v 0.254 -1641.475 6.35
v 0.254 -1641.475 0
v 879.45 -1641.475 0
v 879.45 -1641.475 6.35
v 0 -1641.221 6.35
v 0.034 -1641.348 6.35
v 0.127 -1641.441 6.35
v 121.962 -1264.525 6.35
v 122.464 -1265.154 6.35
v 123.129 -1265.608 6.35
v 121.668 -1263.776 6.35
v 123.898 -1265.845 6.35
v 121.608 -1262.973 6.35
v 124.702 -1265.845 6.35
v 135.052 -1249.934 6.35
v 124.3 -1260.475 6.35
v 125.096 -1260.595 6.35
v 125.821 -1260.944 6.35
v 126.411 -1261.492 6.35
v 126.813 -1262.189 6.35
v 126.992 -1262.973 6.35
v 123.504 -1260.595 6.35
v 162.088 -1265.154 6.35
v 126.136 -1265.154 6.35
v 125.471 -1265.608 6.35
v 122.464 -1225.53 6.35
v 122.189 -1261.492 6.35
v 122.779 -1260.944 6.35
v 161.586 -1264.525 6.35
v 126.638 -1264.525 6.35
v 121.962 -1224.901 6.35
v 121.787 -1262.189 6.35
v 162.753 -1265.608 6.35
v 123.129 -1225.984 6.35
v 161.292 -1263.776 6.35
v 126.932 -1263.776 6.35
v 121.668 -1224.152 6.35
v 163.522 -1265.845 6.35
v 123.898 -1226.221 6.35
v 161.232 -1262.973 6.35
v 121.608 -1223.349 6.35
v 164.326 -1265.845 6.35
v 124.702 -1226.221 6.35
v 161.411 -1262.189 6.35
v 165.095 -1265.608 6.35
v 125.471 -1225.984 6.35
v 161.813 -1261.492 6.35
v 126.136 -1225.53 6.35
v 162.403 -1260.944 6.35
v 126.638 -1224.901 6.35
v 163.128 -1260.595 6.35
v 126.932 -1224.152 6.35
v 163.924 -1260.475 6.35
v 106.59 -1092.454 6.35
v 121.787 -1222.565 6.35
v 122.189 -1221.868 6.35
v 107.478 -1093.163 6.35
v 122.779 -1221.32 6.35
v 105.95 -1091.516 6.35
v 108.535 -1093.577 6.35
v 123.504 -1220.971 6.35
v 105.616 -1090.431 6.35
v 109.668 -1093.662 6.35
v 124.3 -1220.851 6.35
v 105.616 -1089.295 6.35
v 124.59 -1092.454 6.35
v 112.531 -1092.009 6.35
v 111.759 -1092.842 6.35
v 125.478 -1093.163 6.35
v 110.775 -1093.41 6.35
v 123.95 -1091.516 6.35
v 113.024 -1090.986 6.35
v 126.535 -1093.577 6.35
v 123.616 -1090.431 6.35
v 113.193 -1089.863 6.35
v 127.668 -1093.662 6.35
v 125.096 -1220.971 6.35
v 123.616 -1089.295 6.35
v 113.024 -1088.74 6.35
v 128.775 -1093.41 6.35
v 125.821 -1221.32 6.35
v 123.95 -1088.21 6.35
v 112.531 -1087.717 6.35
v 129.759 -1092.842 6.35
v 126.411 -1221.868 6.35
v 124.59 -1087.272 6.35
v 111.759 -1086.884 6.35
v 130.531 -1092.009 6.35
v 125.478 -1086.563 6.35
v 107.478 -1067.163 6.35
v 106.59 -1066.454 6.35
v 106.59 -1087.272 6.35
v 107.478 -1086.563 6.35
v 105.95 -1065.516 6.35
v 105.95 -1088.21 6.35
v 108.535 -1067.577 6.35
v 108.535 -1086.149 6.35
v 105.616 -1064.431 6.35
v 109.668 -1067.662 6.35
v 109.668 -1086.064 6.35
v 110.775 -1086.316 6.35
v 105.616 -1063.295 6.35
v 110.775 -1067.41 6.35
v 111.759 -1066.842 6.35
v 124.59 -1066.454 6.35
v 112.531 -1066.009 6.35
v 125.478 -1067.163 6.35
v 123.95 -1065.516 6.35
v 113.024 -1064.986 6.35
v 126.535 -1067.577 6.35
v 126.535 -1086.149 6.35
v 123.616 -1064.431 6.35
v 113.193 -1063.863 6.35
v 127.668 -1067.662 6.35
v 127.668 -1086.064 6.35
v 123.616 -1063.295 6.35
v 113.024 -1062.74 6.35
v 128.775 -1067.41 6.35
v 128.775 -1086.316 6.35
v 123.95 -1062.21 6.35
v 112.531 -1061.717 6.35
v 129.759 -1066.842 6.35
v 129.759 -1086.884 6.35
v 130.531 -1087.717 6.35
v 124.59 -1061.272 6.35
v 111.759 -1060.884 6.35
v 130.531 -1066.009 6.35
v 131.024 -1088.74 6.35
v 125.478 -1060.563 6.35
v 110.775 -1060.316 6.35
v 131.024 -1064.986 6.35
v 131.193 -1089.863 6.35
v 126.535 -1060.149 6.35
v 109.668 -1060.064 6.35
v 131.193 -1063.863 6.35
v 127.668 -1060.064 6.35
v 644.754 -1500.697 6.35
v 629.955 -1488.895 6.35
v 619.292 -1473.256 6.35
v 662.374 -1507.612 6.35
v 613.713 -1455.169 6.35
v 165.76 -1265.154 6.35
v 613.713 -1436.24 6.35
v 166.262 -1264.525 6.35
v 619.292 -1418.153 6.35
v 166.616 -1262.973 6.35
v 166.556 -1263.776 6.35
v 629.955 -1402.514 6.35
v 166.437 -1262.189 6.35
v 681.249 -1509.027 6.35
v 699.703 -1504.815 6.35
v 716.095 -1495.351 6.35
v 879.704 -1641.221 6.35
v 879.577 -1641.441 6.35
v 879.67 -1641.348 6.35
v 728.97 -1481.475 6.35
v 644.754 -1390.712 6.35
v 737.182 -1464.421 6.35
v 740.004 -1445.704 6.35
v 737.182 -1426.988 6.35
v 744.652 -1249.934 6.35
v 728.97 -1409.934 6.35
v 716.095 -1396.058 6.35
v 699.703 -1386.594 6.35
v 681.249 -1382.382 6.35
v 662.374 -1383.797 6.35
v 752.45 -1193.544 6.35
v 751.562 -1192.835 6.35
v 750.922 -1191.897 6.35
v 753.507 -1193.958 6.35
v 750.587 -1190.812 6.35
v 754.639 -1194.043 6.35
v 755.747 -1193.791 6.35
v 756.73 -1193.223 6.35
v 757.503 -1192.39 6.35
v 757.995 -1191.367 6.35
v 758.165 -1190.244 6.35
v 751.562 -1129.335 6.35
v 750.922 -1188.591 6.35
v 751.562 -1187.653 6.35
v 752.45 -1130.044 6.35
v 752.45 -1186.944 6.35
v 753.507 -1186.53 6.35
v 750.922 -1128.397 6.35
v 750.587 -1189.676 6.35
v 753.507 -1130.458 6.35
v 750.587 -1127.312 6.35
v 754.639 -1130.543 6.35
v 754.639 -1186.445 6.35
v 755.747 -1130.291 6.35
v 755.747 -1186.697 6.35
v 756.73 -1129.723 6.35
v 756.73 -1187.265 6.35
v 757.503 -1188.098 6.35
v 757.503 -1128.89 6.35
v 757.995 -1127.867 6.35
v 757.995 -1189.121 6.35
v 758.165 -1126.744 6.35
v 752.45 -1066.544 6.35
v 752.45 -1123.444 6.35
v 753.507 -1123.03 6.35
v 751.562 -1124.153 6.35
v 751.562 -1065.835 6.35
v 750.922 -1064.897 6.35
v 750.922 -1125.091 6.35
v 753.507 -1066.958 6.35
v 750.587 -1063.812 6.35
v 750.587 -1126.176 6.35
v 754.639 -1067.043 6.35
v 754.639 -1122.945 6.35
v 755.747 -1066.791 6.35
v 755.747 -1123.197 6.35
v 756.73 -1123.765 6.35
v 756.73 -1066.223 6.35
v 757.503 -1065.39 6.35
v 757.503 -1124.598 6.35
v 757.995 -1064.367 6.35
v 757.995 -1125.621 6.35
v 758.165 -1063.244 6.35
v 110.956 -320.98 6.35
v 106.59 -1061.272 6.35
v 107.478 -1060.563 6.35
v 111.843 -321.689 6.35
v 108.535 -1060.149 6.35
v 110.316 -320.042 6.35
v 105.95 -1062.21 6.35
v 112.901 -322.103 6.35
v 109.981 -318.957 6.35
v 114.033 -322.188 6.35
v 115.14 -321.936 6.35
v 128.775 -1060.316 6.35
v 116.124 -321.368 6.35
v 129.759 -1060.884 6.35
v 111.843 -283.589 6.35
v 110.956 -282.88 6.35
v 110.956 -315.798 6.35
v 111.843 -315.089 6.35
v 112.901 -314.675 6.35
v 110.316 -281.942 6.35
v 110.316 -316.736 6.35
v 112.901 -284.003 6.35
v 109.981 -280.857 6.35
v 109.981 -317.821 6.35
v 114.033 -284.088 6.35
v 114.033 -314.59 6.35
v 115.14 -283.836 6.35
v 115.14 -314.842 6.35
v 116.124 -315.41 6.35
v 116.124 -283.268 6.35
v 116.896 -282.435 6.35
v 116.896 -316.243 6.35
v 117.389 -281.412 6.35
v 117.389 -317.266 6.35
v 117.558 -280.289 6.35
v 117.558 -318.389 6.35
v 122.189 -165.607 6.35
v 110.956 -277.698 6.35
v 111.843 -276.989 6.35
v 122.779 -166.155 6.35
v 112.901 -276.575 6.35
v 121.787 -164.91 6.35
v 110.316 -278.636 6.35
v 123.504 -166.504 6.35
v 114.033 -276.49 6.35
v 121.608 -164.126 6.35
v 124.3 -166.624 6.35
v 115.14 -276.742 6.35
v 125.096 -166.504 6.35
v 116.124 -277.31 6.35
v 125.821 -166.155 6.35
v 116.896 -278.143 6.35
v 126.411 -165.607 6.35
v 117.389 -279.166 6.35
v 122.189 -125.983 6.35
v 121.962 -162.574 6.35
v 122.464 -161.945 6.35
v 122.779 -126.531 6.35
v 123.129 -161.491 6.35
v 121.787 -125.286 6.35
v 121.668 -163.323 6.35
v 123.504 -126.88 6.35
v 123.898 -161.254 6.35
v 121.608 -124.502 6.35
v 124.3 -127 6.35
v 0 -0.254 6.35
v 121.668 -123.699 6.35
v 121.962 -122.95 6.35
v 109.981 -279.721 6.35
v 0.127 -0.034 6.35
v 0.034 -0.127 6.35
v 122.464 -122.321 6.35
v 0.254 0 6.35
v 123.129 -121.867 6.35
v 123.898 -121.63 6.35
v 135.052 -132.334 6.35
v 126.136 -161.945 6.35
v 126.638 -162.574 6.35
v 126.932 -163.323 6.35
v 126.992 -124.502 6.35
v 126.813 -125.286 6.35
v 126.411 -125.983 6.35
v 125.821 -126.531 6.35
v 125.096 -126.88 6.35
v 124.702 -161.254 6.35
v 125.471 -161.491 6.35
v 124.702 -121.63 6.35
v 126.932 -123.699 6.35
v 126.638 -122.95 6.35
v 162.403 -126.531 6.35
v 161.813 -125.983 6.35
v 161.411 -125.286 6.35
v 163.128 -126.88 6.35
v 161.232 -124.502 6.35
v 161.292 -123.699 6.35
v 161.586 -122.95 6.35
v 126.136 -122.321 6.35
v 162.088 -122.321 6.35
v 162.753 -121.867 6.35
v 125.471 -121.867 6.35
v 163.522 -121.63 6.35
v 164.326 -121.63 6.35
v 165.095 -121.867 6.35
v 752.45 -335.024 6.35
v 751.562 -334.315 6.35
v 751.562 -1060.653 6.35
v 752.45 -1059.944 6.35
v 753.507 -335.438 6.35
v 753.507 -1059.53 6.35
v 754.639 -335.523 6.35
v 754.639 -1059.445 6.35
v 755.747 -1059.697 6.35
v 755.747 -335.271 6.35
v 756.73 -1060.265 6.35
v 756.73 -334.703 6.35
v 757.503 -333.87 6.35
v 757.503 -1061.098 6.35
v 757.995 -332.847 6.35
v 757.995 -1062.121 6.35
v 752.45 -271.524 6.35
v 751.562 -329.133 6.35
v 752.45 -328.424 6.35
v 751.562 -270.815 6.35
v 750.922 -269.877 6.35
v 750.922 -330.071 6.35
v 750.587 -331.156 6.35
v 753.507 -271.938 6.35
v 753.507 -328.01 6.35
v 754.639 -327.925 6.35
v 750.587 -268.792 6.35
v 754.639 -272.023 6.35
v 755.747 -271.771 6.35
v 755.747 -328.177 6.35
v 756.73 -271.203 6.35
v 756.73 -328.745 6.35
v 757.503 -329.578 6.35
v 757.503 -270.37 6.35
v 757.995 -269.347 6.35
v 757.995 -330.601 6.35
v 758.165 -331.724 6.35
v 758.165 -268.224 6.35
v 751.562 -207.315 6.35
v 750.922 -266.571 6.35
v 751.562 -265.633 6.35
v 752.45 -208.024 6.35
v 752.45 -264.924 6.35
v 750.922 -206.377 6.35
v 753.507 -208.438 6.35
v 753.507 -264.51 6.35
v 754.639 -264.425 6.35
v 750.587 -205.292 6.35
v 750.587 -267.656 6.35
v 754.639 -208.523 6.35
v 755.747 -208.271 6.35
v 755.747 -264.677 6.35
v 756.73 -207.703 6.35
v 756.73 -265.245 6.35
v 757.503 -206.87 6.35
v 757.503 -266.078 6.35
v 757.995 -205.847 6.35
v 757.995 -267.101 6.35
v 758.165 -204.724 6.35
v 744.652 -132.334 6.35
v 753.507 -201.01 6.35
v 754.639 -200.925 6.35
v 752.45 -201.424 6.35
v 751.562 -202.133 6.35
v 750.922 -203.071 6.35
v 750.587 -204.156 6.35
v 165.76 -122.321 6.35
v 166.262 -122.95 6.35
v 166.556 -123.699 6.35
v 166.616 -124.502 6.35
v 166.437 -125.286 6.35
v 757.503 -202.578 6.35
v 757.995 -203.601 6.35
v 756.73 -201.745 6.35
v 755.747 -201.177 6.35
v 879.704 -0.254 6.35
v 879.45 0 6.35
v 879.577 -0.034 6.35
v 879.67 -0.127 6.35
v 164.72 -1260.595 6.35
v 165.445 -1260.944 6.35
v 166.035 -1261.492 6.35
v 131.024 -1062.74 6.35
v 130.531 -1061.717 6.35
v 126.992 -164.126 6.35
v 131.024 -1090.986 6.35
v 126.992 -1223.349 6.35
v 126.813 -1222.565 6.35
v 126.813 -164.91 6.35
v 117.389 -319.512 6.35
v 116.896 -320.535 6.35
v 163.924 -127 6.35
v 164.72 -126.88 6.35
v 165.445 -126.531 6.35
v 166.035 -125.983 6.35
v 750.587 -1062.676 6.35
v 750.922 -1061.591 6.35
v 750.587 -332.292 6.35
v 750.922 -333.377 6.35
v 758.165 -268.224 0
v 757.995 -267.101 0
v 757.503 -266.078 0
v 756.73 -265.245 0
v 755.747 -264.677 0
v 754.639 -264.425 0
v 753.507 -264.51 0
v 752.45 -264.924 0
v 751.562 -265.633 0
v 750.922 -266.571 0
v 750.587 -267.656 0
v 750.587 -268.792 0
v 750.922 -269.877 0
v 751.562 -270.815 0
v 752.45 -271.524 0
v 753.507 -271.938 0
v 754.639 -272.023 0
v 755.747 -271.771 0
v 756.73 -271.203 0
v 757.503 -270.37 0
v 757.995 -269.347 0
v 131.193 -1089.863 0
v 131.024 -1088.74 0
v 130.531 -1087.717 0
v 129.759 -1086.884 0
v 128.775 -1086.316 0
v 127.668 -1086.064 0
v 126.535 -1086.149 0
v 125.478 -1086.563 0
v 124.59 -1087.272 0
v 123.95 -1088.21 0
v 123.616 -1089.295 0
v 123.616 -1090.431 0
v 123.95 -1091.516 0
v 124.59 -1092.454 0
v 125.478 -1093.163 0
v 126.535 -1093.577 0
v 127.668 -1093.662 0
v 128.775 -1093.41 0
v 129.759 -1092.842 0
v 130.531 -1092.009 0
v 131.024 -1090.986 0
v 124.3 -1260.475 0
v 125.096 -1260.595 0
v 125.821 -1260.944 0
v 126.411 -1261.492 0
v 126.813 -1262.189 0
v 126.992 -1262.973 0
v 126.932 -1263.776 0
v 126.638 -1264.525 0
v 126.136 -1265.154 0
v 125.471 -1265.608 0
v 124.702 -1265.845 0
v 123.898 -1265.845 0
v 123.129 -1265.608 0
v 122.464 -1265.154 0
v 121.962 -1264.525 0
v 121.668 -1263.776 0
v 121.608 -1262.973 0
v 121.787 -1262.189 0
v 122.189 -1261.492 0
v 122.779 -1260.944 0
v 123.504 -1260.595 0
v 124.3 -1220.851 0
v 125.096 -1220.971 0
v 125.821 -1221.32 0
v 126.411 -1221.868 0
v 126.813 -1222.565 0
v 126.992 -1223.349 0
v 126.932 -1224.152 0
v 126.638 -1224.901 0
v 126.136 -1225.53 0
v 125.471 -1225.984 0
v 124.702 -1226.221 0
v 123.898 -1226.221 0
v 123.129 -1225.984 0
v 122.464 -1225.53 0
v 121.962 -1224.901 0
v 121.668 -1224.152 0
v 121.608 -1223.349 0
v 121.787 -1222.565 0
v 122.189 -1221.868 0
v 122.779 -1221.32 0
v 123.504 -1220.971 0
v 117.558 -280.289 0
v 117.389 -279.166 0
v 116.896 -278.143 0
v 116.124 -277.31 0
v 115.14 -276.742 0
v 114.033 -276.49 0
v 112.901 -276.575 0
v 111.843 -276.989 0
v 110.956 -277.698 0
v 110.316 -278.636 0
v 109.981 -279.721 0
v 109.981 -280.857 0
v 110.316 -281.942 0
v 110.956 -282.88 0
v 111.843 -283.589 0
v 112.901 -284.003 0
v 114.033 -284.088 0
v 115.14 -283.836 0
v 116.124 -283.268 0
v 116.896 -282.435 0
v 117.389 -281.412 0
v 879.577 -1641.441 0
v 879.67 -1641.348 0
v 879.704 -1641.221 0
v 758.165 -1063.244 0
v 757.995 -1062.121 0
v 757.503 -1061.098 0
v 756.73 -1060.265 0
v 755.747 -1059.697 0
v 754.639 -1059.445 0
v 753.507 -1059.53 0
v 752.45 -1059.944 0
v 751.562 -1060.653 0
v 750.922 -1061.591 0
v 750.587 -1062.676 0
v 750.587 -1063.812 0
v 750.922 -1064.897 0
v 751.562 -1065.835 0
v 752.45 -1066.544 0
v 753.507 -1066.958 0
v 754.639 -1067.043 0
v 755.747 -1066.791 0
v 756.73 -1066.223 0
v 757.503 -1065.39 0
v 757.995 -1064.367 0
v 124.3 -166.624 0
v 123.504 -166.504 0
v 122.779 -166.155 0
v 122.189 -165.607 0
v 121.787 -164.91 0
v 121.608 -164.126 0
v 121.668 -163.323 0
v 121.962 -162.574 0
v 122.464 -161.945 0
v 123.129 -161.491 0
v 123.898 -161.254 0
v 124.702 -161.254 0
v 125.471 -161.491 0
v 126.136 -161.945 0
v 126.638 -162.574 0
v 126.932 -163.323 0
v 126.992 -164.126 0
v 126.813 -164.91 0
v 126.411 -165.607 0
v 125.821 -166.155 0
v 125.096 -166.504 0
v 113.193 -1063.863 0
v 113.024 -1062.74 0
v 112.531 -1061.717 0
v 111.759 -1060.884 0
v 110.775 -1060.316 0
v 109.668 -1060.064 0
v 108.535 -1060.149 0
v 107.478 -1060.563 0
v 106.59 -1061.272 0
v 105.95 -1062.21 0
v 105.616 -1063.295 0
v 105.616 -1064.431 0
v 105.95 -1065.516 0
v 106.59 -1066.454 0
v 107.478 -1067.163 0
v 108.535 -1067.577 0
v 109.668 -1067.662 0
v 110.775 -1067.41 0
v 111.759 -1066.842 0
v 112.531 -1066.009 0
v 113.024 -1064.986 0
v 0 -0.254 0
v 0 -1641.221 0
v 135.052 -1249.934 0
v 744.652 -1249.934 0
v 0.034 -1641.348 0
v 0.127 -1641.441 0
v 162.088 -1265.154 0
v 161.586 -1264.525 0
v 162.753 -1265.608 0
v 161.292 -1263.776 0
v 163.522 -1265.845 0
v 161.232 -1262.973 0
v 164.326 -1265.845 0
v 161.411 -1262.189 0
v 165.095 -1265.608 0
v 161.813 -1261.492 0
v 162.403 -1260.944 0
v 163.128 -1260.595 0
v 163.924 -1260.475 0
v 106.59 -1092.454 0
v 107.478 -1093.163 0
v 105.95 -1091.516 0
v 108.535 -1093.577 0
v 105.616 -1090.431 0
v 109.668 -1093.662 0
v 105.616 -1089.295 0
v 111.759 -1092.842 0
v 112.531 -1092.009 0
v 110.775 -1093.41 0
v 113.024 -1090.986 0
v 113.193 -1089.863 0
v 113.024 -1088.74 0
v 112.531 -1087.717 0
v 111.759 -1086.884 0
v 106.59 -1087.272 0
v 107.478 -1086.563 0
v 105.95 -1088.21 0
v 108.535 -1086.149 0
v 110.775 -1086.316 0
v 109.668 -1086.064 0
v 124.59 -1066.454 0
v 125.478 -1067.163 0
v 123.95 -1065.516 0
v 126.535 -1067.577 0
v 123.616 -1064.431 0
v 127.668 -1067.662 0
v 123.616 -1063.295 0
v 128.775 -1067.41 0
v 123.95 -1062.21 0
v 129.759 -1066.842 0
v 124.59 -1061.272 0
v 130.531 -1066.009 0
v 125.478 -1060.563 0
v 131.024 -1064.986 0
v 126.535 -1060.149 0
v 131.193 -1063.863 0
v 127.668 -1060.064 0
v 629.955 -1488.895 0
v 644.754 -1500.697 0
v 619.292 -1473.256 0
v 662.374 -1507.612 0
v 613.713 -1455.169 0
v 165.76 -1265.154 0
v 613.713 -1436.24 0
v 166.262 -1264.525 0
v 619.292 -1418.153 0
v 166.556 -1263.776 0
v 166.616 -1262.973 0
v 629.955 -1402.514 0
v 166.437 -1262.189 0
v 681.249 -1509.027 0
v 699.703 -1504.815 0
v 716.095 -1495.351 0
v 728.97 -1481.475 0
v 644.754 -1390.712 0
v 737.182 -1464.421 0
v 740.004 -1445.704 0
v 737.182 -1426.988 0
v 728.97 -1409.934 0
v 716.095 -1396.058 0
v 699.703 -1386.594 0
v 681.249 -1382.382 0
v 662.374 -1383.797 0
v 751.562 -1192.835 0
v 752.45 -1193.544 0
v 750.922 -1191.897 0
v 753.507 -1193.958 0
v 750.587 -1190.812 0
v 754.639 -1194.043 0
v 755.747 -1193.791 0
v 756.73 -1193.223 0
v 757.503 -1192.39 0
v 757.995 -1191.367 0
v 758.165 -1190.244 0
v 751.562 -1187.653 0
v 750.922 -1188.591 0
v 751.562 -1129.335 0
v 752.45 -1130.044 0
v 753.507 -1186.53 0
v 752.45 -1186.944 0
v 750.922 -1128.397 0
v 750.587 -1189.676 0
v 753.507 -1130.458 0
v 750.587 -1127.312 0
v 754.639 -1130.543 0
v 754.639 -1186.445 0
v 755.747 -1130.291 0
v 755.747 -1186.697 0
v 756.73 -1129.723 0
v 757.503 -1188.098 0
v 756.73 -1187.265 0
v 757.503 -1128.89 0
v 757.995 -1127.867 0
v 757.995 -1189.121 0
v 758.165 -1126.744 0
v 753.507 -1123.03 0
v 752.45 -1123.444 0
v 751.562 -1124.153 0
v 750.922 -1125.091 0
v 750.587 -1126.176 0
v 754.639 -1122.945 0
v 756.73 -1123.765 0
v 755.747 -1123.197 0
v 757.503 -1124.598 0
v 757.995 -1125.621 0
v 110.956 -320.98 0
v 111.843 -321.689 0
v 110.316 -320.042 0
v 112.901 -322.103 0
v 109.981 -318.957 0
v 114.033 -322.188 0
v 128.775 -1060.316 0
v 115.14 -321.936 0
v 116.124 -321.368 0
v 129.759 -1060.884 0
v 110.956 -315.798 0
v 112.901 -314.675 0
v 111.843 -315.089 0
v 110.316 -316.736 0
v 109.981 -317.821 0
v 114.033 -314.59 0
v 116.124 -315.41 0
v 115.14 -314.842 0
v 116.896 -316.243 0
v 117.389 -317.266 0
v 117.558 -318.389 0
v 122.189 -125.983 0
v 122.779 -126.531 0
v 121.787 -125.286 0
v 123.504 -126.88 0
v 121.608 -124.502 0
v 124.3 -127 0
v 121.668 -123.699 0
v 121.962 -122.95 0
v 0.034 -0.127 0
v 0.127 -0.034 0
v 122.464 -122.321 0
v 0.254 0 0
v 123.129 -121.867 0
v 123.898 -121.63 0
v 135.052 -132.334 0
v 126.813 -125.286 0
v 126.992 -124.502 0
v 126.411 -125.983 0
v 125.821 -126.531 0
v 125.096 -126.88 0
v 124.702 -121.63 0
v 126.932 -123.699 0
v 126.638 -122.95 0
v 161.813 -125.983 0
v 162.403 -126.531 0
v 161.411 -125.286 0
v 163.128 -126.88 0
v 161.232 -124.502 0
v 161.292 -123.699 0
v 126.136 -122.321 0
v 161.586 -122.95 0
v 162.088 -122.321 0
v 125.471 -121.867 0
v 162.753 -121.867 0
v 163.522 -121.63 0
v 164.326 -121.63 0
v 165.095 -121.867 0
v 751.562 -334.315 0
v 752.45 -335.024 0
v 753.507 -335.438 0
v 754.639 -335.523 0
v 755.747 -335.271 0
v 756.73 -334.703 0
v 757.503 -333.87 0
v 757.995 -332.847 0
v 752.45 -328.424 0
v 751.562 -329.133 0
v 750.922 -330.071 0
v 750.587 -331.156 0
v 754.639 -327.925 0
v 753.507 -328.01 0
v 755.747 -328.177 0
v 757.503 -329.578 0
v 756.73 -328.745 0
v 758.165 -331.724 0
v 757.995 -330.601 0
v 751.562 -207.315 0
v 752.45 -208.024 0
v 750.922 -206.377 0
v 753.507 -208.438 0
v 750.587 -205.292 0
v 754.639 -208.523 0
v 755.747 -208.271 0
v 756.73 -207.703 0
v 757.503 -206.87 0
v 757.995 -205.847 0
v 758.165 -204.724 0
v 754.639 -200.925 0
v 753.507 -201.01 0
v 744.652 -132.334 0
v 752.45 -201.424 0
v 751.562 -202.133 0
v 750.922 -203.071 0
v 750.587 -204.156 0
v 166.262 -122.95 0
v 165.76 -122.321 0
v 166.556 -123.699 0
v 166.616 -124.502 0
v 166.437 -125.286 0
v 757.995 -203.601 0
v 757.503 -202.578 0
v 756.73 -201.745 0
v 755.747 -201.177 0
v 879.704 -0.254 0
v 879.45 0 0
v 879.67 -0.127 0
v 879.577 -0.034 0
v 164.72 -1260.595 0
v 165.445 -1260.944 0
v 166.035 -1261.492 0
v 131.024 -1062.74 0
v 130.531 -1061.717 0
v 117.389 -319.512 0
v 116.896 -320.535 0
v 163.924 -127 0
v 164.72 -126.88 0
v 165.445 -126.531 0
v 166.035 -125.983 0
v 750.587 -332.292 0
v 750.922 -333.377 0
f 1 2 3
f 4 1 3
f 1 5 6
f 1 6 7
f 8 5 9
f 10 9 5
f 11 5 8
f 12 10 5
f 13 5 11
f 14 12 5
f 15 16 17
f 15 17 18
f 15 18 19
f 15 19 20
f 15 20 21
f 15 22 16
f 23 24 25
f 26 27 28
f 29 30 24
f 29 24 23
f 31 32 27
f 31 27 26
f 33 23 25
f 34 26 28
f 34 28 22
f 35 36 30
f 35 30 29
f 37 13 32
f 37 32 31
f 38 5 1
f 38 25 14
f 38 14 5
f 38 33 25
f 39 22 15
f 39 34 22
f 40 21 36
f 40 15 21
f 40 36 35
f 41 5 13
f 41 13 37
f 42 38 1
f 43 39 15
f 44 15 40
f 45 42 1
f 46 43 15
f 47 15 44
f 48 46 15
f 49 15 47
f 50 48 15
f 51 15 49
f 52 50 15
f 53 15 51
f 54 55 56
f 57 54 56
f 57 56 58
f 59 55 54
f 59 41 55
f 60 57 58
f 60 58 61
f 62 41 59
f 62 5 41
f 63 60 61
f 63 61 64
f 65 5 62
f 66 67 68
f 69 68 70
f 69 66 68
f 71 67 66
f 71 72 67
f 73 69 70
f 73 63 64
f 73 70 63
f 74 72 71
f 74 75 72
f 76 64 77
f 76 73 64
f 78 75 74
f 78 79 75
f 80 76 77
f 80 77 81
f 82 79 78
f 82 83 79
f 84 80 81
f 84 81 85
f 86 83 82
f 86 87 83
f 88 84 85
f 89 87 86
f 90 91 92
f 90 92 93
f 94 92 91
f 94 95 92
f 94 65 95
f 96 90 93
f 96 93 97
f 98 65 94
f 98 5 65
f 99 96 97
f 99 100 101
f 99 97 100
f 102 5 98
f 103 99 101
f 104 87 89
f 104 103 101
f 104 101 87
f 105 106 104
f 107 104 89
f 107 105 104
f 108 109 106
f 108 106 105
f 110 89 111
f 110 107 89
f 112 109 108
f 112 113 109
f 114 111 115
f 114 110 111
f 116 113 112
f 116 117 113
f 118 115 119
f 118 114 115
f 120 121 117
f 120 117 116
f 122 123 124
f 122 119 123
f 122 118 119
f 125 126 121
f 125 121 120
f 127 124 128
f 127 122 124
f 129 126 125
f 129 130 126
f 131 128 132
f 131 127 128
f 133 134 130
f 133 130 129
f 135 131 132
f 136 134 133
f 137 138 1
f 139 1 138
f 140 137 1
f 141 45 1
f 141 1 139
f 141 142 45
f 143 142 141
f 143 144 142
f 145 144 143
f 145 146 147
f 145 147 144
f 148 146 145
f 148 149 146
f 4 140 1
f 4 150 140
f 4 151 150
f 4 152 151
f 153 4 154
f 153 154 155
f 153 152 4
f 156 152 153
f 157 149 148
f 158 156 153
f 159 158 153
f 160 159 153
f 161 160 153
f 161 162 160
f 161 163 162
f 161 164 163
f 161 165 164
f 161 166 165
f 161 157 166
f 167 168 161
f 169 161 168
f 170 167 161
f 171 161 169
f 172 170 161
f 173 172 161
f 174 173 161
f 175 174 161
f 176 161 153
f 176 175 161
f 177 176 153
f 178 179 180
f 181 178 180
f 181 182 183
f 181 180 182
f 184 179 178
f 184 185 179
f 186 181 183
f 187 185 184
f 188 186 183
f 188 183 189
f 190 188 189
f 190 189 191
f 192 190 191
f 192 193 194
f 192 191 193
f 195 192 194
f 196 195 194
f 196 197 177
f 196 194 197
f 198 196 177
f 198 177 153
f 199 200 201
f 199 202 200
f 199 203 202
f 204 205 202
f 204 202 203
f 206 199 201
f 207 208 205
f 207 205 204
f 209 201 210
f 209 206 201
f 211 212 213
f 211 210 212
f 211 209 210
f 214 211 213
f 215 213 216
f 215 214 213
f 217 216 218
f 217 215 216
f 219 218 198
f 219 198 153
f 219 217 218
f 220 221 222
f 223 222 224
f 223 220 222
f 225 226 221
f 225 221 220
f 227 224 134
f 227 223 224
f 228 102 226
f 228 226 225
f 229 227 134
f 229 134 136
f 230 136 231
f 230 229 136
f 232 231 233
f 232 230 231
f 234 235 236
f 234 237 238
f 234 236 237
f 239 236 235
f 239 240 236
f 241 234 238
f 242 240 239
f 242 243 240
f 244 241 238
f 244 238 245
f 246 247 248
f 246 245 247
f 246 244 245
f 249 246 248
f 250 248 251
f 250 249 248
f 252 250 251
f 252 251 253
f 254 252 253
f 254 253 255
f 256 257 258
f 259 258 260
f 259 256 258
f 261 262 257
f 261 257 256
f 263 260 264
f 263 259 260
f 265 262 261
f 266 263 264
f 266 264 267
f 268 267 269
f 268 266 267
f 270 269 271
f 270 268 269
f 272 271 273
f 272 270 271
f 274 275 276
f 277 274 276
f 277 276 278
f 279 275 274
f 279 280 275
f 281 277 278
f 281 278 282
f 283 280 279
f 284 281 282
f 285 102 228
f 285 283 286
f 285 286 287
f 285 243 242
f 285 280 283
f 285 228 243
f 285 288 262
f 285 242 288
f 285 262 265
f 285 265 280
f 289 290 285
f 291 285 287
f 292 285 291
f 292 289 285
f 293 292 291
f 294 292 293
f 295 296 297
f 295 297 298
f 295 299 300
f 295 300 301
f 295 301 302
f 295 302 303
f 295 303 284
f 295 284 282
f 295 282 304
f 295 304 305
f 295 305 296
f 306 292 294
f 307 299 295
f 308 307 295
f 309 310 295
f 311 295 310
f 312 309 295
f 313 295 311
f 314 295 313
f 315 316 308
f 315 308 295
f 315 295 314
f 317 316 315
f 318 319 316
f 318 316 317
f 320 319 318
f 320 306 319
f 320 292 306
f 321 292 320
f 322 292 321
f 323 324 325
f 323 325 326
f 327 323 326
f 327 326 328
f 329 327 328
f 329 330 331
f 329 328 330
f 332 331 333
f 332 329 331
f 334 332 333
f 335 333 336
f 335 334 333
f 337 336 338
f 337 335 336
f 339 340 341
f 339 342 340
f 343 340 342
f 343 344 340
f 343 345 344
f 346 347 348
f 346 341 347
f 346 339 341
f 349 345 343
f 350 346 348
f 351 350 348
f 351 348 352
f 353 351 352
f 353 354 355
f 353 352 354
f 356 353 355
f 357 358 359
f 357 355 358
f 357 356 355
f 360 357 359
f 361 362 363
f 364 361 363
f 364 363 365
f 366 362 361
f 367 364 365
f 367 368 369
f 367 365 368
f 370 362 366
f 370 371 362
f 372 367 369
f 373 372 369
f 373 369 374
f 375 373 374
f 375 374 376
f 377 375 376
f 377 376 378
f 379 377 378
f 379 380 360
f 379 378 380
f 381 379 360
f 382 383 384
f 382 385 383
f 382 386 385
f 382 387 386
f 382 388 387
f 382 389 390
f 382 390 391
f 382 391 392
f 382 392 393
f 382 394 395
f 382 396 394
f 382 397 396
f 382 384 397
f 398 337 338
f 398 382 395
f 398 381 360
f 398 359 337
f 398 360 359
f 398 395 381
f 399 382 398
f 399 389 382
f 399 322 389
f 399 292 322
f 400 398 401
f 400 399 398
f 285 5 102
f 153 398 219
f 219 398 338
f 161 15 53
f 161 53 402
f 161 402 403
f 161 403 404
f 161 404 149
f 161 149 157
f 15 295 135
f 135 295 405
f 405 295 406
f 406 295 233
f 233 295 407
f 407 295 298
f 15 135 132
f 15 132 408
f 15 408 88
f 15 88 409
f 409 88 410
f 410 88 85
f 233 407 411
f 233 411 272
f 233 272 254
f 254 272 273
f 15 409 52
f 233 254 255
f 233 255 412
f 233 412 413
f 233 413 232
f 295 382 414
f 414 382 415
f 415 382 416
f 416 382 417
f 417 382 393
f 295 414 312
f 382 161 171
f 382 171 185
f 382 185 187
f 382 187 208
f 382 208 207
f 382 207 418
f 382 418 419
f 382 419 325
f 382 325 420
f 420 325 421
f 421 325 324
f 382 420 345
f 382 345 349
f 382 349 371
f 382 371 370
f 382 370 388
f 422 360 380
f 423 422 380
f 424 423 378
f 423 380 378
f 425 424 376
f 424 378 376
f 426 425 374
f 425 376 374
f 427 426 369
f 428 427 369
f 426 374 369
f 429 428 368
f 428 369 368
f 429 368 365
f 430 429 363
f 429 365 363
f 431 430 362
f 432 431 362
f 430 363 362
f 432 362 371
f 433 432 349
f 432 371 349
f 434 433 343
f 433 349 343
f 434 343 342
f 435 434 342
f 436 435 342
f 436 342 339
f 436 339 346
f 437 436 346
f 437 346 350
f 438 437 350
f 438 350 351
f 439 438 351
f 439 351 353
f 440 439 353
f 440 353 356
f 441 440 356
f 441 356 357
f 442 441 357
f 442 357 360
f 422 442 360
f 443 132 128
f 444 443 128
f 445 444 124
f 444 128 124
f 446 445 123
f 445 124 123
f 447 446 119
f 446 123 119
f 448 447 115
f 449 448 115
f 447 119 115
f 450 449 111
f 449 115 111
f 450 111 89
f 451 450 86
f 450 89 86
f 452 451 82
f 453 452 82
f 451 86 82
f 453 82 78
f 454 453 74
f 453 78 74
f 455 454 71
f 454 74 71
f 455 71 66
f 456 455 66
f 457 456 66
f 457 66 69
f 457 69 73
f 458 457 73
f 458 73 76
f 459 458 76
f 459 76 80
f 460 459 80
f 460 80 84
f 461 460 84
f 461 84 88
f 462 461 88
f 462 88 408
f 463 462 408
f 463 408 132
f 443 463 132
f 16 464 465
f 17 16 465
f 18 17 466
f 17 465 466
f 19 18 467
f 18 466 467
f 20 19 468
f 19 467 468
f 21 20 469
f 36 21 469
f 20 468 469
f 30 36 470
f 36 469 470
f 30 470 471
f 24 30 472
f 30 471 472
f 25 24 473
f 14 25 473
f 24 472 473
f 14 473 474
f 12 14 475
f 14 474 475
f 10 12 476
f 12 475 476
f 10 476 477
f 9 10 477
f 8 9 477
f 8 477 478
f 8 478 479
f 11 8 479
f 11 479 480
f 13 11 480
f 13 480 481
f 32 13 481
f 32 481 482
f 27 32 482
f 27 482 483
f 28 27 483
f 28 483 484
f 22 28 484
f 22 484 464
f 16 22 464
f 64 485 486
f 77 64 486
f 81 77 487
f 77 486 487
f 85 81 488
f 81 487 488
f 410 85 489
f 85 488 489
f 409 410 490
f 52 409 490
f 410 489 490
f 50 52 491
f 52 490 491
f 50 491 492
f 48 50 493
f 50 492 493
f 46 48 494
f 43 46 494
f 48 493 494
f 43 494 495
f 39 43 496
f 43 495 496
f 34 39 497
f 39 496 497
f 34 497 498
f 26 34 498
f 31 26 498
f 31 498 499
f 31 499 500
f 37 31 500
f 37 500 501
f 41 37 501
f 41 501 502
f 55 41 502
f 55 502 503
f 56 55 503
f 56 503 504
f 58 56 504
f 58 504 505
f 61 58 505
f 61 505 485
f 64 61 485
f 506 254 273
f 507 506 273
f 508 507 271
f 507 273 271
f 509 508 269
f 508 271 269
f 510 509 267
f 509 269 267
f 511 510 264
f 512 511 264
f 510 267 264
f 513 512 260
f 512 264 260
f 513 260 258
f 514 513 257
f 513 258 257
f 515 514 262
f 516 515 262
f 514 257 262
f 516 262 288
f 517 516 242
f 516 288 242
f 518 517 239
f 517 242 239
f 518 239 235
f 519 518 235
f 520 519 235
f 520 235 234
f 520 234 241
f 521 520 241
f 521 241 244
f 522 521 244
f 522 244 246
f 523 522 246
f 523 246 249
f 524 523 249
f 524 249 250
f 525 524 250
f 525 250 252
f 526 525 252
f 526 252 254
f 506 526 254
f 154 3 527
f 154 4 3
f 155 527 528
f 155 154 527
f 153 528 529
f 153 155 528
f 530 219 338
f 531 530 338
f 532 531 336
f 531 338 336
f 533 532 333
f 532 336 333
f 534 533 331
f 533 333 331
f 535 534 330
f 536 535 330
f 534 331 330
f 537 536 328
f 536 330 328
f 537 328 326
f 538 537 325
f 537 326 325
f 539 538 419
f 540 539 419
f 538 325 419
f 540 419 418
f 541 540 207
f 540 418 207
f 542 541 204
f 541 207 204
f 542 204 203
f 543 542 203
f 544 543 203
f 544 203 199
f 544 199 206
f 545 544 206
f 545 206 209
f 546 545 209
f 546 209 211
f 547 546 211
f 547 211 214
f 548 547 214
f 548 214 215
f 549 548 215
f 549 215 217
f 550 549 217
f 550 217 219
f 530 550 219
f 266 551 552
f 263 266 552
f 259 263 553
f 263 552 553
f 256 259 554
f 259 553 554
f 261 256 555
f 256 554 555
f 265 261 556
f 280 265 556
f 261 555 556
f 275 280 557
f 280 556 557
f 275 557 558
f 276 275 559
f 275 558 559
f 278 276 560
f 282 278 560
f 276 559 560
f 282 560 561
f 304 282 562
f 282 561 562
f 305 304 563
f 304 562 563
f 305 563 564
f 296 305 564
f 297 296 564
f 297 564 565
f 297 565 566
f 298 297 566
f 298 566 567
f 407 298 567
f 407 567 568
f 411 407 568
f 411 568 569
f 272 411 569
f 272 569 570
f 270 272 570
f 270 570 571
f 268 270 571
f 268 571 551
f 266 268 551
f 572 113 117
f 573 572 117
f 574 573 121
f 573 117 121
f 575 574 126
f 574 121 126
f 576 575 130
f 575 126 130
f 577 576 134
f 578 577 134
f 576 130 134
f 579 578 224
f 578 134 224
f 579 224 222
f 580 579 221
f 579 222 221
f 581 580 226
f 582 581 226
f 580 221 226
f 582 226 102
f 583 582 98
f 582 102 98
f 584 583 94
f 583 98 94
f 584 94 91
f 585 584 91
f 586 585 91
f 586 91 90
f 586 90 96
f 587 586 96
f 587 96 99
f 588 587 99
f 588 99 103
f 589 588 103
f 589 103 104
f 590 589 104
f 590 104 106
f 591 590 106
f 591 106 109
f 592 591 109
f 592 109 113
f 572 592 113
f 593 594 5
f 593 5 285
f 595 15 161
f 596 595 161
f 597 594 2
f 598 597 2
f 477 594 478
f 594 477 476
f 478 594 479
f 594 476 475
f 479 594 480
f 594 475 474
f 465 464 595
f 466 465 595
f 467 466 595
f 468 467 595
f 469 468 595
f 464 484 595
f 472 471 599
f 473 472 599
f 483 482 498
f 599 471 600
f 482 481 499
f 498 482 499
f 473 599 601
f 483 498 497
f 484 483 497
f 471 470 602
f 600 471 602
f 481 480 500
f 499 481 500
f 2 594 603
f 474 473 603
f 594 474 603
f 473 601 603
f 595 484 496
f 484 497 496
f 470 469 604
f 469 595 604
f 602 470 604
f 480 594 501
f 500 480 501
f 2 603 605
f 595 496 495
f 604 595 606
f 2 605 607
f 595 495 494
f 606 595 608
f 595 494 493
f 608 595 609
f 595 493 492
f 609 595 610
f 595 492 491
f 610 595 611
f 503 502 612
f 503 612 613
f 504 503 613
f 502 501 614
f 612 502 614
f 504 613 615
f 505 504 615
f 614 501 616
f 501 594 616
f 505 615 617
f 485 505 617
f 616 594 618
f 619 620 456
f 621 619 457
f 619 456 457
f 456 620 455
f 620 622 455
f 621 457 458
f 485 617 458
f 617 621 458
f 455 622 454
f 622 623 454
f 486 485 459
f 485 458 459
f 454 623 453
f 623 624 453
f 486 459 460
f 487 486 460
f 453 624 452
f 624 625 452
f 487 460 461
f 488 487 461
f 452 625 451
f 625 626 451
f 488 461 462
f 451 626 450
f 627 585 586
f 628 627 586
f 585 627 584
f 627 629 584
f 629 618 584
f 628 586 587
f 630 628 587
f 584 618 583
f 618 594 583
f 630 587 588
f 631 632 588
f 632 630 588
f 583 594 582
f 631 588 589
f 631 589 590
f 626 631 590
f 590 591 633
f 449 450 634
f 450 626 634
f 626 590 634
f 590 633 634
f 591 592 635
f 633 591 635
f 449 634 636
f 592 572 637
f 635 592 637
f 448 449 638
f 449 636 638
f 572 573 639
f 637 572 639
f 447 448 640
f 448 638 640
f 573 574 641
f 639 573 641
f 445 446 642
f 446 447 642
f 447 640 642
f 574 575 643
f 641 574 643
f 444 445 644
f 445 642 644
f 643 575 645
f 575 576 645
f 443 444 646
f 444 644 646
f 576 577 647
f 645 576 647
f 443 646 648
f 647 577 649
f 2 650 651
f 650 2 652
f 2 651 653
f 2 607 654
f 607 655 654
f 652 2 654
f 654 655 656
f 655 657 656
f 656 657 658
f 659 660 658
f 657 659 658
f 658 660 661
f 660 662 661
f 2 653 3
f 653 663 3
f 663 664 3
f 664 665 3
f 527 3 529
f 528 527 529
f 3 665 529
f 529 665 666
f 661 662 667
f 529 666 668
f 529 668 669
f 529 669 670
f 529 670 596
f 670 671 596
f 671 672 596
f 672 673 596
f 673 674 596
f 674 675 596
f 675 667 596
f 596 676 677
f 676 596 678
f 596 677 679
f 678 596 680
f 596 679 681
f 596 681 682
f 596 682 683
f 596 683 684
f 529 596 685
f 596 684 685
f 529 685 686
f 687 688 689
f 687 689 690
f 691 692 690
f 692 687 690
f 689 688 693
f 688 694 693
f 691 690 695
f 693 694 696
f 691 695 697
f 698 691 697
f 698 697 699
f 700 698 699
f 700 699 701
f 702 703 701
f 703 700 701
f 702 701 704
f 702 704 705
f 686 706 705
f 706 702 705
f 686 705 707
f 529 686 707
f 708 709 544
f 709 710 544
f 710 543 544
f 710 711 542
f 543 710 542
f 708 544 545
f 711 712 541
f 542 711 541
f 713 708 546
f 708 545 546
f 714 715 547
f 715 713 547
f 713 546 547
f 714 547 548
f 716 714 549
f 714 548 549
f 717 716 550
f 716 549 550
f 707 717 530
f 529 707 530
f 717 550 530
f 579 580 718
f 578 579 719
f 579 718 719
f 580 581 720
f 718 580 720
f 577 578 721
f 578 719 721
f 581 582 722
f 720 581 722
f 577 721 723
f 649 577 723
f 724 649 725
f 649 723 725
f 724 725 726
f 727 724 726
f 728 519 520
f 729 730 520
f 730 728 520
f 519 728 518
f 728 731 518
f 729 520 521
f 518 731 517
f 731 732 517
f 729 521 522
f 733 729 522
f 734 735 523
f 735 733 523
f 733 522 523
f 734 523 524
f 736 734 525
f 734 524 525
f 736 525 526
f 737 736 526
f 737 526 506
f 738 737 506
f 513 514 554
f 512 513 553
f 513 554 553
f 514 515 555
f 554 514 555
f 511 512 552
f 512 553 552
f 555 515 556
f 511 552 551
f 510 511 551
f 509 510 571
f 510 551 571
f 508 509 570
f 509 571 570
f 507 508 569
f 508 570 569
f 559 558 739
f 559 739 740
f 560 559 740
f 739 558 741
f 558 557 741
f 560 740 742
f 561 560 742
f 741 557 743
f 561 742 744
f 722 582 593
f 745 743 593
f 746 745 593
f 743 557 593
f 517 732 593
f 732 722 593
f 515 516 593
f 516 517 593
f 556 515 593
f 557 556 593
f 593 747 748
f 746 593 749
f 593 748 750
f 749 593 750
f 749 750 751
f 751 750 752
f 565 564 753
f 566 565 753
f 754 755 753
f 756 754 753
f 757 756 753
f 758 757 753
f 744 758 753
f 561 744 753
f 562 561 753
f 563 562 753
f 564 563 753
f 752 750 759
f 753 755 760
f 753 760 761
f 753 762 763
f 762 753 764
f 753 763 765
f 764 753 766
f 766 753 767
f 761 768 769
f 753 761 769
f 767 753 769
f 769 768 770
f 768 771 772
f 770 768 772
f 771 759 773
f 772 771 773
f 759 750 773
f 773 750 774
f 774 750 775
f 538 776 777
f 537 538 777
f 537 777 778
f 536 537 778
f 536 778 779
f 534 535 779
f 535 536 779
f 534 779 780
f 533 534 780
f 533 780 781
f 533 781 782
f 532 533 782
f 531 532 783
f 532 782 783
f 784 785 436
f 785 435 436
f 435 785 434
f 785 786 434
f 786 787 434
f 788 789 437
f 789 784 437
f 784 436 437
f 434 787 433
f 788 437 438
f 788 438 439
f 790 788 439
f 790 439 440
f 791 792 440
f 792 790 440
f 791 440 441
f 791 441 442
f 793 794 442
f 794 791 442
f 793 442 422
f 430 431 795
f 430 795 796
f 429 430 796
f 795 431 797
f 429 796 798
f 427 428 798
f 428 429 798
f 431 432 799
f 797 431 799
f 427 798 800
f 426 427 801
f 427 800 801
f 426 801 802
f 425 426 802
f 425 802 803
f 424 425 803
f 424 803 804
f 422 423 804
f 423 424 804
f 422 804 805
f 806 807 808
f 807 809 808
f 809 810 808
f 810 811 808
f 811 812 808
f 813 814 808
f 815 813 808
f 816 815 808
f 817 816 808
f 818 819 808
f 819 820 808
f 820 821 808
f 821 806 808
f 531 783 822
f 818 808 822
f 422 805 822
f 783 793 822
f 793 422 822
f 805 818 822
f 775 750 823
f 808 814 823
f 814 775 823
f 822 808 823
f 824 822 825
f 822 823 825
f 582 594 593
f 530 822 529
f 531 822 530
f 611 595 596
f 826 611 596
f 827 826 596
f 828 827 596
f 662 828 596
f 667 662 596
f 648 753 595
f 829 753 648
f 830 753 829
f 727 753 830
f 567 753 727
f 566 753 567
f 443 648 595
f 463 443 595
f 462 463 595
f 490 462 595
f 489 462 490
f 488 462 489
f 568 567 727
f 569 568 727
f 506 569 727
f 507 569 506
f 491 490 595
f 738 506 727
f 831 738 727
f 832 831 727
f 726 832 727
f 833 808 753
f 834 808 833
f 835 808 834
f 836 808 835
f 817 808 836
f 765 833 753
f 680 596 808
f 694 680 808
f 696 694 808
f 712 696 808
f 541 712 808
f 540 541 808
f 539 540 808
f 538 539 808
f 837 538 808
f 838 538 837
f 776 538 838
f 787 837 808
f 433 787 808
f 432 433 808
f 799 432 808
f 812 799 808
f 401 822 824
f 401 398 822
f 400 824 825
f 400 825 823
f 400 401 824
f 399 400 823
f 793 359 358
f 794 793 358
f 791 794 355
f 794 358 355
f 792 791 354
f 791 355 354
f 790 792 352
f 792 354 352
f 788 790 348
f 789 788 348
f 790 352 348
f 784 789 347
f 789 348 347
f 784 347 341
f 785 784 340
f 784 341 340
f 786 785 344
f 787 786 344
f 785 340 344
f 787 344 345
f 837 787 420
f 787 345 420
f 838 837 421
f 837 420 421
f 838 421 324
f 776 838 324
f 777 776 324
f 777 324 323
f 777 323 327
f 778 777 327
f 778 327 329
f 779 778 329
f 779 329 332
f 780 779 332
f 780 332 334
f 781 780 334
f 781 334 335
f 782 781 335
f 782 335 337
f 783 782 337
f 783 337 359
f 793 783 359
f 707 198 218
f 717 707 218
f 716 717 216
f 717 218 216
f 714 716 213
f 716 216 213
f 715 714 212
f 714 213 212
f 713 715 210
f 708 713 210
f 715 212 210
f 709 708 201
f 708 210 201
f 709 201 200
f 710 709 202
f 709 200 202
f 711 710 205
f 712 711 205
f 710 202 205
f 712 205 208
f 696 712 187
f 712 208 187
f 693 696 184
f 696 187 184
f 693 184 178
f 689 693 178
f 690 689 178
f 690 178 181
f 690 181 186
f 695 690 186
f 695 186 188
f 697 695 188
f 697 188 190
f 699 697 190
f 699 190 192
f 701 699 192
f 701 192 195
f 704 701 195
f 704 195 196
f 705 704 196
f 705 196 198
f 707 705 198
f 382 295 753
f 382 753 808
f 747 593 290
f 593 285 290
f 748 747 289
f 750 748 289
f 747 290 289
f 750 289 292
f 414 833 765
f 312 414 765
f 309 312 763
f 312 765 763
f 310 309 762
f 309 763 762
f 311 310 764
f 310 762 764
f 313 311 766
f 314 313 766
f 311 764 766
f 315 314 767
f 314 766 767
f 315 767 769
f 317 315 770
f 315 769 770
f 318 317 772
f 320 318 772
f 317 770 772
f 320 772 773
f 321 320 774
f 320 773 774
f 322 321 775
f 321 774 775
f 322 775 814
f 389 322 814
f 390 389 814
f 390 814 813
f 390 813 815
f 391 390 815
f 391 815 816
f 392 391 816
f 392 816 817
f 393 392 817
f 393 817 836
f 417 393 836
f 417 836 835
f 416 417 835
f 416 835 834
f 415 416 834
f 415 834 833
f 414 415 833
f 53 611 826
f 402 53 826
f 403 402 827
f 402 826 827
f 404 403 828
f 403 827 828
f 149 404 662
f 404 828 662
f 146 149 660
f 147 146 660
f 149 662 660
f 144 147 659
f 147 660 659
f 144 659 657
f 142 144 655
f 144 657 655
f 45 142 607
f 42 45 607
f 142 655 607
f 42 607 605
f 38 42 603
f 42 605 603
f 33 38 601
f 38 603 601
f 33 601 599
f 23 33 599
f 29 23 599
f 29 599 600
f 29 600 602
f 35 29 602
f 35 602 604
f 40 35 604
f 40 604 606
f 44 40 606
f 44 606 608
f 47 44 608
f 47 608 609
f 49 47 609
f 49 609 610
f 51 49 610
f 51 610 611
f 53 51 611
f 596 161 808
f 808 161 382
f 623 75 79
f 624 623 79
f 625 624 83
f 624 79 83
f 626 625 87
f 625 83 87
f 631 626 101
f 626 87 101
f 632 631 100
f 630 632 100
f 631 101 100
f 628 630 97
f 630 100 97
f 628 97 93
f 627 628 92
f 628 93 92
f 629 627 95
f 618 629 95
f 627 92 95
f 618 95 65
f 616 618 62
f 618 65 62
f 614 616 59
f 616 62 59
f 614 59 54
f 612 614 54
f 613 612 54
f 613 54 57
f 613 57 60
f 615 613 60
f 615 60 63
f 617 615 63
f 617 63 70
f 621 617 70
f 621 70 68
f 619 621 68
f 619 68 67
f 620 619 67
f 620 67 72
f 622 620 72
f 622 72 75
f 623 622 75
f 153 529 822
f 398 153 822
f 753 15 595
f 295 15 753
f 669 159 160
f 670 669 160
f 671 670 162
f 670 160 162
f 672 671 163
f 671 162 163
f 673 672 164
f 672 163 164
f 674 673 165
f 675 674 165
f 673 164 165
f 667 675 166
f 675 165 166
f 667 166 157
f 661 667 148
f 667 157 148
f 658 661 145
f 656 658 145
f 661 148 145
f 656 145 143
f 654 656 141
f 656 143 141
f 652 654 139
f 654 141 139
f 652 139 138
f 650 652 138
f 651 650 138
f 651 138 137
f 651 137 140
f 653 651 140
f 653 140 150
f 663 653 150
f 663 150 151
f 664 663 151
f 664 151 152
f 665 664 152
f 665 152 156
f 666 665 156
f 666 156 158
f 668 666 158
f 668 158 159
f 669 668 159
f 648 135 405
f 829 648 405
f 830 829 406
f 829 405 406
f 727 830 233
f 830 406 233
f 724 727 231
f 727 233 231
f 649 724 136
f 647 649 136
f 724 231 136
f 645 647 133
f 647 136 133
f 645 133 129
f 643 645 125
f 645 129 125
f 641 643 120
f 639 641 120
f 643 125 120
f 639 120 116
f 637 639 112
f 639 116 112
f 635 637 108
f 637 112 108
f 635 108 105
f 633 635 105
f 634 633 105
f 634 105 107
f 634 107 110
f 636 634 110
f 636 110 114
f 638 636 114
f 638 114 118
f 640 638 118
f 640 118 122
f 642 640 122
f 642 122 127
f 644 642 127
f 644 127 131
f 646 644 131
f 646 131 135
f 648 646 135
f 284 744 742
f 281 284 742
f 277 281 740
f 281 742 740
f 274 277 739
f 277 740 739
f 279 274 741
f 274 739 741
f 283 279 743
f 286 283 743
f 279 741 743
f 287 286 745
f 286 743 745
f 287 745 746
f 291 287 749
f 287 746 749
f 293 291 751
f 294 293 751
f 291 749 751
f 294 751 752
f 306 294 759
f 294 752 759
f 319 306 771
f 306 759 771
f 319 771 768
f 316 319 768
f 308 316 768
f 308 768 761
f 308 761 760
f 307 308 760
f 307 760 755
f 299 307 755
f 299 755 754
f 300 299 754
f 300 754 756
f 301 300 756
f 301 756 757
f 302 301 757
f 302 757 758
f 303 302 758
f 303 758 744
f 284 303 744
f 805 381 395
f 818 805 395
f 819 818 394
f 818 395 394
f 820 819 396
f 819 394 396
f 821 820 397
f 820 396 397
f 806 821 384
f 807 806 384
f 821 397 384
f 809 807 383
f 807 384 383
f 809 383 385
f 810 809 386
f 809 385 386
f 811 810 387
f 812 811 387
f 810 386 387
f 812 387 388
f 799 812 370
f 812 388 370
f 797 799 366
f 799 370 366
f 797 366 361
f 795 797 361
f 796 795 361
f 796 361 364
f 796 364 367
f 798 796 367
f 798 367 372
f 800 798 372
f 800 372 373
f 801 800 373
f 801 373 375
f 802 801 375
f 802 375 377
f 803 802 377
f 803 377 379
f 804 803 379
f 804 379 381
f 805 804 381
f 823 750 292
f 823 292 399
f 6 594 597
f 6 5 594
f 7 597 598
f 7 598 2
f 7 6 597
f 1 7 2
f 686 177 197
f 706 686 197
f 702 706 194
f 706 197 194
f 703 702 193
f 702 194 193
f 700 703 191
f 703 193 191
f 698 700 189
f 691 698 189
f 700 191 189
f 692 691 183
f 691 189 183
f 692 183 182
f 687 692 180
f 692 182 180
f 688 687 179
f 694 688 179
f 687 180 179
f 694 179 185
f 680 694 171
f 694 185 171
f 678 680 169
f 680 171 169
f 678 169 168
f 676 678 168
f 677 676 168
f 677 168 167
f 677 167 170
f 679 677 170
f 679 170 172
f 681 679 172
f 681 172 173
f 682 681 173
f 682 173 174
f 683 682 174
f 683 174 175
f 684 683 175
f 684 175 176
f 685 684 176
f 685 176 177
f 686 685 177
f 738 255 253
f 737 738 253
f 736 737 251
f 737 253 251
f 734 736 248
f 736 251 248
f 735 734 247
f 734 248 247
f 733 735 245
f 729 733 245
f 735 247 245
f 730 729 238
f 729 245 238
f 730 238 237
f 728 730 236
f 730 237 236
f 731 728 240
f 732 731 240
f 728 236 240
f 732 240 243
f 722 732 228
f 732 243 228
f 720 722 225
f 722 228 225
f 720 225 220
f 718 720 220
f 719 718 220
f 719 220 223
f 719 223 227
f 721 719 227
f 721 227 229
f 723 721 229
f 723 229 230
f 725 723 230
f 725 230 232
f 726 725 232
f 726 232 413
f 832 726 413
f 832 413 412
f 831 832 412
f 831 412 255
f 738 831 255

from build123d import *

# Parameters (mm, degrees)
SKETCH1_W           = 879.7036
SKETCH1_H           = 1641.475
BOSS_EXTRUDE1_DEPTH = 6.35
FILLET1_R           = 0.254
SKETCH2_W           = 609.6
SKETCH2_H           = 1117.6
CUT_EXTRUDE1_DEPTH  = 1863.353060507
SKETCH3_R           = 3.81
CUT_EXTRUDE2_DEPTH  = 1863.353060507
SKETCH5_R           = 63.5
CUT_EXTRUDE4_DEPTH  = 1863.353060507
SKETCH6_R           = 2.7
CUT_EXTRUDE5_DEPTH  = 1863.353060507


with BuildPart() as part:
    # Sketch1 → Boss-Extrude1 (new body)
    with BuildSketch(Plane.XY):
        with Locations((439.8518, -820.7375)):
            Rectangle(SKETCH1_W, SKETCH1_H)
    extrude(amount=BOSS_EXTRUDE1_DEPTH)

    # Fillet1
    fillet1_edges = [part.edges().sort_by_distance(p)[0] for p in [
        (879.7036, -1641.475, 3.175),
        (0, -1641.475, 3.175),
        (0, 0, 3.175),
        (879.7036, 0, 3.175),
    ]]
    fillet(fillet1_edges, radius=FILLET1_R)

    # Sketch2 → Cut-Extrude1 (cut, through all)
    with BuildSketch(Plane.XY.offset(6.35)):
        with Locations((439.8518, -691.134)):
            Rectangle(SKETCH2_W, SKETCH2_H)
    extrude(amount=-CUT_EXTRUDE1_DEPTH, mode=Mode.SUBTRACT)

    # Sketch3 → Cut-Extrude2 (cut, through all)
    with BuildSketch(Plane.XY.offset(6.35)):
        with Locations((754.3546, -204.724)):
            Circle(SKETCH3_R)
        with Locations((754.3546, -268.224)):
            Circle(SKETCH3_R)
        with Locations((754.3546, -331.724)):
            Circle(SKETCH3_R)
        with Locations((754.3546, -1190.244)):
            Circle(SKETCH3_R)
        with Locations((754.3546, -1126.744)):
            Circle(SKETCH3_R)
        with Locations((754.3546, -1063.244)):
            Circle(SKETCH3_R)
        with Locations((109.383049966, -1063.863000196)):
            Circle(SKETCH3_R)
        with Locations((127.383050034, -1063.863000196)):
            Circle(SKETCH3_R)
        with Locations((127.383050034, -1089.863000266)):
            Circle(SKETCH3_R)
        with Locations((109.383049966, -1089.863000266)):
            Circle(SKETCH3_R)
        with Locations((113.748448168, -280.289)):
            Circle(SKETCH3_R)
        with Locations((113.748448168, -318.389)):
            Circle(SKETCH3_R)
    extrude(amount=-CUT_EXTRUDE2_DEPTH, mode=Mode.SUBTRACT)

    # Sketch5 → Cut-Extrude4 (cut, through all)
    with BuildSketch(Plane.XY.offset(6.35)):
        with Locations((676.5036, -1445.7045)):
            Circle(SKETCH5_R)
    extrude(amount=-CUT_EXTRUDE4_DEPTH, mode=Mode.SUBTRACT)

    # Sketch6 → Cut-Extrude5 (cut, through all)
    with BuildSketch(Plane(origin=(0, 0, 0), x_dir=(-1, 0, 0), z_dir=(0, 0, -1))):
        with Locations(Location((-124.3, -1223.551, 0), (0, 0, 90))):
            Circle(SKETCH6_R)
        with Locations(Location((-124.3, -1263.175, 0), (0, 0, 90))):
            Circle(SKETCH6_R)
        with Locations(Location((-163.924, -1263.175, 0), (0, 0, 90))):
            Circle(SKETCH6_R)
        with Locations(Location((-163.924, -124.3, 0), (0, 0, 270))):
            Circle(SKETCH6_R)
        with Locations(Location((-124.3, -124.3, 0), (0, 0, 270))):
            Circle(SKETCH6_R)
        with Locations(Location((-124.3, -163.924, 0), (0, 0, 270))):
            Circle(SKETCH6_R)
    extrude(amount=-CUT_EXTRUDE5_DEPTH, mode=Mode.SUBTRACT)


solid = part.part
